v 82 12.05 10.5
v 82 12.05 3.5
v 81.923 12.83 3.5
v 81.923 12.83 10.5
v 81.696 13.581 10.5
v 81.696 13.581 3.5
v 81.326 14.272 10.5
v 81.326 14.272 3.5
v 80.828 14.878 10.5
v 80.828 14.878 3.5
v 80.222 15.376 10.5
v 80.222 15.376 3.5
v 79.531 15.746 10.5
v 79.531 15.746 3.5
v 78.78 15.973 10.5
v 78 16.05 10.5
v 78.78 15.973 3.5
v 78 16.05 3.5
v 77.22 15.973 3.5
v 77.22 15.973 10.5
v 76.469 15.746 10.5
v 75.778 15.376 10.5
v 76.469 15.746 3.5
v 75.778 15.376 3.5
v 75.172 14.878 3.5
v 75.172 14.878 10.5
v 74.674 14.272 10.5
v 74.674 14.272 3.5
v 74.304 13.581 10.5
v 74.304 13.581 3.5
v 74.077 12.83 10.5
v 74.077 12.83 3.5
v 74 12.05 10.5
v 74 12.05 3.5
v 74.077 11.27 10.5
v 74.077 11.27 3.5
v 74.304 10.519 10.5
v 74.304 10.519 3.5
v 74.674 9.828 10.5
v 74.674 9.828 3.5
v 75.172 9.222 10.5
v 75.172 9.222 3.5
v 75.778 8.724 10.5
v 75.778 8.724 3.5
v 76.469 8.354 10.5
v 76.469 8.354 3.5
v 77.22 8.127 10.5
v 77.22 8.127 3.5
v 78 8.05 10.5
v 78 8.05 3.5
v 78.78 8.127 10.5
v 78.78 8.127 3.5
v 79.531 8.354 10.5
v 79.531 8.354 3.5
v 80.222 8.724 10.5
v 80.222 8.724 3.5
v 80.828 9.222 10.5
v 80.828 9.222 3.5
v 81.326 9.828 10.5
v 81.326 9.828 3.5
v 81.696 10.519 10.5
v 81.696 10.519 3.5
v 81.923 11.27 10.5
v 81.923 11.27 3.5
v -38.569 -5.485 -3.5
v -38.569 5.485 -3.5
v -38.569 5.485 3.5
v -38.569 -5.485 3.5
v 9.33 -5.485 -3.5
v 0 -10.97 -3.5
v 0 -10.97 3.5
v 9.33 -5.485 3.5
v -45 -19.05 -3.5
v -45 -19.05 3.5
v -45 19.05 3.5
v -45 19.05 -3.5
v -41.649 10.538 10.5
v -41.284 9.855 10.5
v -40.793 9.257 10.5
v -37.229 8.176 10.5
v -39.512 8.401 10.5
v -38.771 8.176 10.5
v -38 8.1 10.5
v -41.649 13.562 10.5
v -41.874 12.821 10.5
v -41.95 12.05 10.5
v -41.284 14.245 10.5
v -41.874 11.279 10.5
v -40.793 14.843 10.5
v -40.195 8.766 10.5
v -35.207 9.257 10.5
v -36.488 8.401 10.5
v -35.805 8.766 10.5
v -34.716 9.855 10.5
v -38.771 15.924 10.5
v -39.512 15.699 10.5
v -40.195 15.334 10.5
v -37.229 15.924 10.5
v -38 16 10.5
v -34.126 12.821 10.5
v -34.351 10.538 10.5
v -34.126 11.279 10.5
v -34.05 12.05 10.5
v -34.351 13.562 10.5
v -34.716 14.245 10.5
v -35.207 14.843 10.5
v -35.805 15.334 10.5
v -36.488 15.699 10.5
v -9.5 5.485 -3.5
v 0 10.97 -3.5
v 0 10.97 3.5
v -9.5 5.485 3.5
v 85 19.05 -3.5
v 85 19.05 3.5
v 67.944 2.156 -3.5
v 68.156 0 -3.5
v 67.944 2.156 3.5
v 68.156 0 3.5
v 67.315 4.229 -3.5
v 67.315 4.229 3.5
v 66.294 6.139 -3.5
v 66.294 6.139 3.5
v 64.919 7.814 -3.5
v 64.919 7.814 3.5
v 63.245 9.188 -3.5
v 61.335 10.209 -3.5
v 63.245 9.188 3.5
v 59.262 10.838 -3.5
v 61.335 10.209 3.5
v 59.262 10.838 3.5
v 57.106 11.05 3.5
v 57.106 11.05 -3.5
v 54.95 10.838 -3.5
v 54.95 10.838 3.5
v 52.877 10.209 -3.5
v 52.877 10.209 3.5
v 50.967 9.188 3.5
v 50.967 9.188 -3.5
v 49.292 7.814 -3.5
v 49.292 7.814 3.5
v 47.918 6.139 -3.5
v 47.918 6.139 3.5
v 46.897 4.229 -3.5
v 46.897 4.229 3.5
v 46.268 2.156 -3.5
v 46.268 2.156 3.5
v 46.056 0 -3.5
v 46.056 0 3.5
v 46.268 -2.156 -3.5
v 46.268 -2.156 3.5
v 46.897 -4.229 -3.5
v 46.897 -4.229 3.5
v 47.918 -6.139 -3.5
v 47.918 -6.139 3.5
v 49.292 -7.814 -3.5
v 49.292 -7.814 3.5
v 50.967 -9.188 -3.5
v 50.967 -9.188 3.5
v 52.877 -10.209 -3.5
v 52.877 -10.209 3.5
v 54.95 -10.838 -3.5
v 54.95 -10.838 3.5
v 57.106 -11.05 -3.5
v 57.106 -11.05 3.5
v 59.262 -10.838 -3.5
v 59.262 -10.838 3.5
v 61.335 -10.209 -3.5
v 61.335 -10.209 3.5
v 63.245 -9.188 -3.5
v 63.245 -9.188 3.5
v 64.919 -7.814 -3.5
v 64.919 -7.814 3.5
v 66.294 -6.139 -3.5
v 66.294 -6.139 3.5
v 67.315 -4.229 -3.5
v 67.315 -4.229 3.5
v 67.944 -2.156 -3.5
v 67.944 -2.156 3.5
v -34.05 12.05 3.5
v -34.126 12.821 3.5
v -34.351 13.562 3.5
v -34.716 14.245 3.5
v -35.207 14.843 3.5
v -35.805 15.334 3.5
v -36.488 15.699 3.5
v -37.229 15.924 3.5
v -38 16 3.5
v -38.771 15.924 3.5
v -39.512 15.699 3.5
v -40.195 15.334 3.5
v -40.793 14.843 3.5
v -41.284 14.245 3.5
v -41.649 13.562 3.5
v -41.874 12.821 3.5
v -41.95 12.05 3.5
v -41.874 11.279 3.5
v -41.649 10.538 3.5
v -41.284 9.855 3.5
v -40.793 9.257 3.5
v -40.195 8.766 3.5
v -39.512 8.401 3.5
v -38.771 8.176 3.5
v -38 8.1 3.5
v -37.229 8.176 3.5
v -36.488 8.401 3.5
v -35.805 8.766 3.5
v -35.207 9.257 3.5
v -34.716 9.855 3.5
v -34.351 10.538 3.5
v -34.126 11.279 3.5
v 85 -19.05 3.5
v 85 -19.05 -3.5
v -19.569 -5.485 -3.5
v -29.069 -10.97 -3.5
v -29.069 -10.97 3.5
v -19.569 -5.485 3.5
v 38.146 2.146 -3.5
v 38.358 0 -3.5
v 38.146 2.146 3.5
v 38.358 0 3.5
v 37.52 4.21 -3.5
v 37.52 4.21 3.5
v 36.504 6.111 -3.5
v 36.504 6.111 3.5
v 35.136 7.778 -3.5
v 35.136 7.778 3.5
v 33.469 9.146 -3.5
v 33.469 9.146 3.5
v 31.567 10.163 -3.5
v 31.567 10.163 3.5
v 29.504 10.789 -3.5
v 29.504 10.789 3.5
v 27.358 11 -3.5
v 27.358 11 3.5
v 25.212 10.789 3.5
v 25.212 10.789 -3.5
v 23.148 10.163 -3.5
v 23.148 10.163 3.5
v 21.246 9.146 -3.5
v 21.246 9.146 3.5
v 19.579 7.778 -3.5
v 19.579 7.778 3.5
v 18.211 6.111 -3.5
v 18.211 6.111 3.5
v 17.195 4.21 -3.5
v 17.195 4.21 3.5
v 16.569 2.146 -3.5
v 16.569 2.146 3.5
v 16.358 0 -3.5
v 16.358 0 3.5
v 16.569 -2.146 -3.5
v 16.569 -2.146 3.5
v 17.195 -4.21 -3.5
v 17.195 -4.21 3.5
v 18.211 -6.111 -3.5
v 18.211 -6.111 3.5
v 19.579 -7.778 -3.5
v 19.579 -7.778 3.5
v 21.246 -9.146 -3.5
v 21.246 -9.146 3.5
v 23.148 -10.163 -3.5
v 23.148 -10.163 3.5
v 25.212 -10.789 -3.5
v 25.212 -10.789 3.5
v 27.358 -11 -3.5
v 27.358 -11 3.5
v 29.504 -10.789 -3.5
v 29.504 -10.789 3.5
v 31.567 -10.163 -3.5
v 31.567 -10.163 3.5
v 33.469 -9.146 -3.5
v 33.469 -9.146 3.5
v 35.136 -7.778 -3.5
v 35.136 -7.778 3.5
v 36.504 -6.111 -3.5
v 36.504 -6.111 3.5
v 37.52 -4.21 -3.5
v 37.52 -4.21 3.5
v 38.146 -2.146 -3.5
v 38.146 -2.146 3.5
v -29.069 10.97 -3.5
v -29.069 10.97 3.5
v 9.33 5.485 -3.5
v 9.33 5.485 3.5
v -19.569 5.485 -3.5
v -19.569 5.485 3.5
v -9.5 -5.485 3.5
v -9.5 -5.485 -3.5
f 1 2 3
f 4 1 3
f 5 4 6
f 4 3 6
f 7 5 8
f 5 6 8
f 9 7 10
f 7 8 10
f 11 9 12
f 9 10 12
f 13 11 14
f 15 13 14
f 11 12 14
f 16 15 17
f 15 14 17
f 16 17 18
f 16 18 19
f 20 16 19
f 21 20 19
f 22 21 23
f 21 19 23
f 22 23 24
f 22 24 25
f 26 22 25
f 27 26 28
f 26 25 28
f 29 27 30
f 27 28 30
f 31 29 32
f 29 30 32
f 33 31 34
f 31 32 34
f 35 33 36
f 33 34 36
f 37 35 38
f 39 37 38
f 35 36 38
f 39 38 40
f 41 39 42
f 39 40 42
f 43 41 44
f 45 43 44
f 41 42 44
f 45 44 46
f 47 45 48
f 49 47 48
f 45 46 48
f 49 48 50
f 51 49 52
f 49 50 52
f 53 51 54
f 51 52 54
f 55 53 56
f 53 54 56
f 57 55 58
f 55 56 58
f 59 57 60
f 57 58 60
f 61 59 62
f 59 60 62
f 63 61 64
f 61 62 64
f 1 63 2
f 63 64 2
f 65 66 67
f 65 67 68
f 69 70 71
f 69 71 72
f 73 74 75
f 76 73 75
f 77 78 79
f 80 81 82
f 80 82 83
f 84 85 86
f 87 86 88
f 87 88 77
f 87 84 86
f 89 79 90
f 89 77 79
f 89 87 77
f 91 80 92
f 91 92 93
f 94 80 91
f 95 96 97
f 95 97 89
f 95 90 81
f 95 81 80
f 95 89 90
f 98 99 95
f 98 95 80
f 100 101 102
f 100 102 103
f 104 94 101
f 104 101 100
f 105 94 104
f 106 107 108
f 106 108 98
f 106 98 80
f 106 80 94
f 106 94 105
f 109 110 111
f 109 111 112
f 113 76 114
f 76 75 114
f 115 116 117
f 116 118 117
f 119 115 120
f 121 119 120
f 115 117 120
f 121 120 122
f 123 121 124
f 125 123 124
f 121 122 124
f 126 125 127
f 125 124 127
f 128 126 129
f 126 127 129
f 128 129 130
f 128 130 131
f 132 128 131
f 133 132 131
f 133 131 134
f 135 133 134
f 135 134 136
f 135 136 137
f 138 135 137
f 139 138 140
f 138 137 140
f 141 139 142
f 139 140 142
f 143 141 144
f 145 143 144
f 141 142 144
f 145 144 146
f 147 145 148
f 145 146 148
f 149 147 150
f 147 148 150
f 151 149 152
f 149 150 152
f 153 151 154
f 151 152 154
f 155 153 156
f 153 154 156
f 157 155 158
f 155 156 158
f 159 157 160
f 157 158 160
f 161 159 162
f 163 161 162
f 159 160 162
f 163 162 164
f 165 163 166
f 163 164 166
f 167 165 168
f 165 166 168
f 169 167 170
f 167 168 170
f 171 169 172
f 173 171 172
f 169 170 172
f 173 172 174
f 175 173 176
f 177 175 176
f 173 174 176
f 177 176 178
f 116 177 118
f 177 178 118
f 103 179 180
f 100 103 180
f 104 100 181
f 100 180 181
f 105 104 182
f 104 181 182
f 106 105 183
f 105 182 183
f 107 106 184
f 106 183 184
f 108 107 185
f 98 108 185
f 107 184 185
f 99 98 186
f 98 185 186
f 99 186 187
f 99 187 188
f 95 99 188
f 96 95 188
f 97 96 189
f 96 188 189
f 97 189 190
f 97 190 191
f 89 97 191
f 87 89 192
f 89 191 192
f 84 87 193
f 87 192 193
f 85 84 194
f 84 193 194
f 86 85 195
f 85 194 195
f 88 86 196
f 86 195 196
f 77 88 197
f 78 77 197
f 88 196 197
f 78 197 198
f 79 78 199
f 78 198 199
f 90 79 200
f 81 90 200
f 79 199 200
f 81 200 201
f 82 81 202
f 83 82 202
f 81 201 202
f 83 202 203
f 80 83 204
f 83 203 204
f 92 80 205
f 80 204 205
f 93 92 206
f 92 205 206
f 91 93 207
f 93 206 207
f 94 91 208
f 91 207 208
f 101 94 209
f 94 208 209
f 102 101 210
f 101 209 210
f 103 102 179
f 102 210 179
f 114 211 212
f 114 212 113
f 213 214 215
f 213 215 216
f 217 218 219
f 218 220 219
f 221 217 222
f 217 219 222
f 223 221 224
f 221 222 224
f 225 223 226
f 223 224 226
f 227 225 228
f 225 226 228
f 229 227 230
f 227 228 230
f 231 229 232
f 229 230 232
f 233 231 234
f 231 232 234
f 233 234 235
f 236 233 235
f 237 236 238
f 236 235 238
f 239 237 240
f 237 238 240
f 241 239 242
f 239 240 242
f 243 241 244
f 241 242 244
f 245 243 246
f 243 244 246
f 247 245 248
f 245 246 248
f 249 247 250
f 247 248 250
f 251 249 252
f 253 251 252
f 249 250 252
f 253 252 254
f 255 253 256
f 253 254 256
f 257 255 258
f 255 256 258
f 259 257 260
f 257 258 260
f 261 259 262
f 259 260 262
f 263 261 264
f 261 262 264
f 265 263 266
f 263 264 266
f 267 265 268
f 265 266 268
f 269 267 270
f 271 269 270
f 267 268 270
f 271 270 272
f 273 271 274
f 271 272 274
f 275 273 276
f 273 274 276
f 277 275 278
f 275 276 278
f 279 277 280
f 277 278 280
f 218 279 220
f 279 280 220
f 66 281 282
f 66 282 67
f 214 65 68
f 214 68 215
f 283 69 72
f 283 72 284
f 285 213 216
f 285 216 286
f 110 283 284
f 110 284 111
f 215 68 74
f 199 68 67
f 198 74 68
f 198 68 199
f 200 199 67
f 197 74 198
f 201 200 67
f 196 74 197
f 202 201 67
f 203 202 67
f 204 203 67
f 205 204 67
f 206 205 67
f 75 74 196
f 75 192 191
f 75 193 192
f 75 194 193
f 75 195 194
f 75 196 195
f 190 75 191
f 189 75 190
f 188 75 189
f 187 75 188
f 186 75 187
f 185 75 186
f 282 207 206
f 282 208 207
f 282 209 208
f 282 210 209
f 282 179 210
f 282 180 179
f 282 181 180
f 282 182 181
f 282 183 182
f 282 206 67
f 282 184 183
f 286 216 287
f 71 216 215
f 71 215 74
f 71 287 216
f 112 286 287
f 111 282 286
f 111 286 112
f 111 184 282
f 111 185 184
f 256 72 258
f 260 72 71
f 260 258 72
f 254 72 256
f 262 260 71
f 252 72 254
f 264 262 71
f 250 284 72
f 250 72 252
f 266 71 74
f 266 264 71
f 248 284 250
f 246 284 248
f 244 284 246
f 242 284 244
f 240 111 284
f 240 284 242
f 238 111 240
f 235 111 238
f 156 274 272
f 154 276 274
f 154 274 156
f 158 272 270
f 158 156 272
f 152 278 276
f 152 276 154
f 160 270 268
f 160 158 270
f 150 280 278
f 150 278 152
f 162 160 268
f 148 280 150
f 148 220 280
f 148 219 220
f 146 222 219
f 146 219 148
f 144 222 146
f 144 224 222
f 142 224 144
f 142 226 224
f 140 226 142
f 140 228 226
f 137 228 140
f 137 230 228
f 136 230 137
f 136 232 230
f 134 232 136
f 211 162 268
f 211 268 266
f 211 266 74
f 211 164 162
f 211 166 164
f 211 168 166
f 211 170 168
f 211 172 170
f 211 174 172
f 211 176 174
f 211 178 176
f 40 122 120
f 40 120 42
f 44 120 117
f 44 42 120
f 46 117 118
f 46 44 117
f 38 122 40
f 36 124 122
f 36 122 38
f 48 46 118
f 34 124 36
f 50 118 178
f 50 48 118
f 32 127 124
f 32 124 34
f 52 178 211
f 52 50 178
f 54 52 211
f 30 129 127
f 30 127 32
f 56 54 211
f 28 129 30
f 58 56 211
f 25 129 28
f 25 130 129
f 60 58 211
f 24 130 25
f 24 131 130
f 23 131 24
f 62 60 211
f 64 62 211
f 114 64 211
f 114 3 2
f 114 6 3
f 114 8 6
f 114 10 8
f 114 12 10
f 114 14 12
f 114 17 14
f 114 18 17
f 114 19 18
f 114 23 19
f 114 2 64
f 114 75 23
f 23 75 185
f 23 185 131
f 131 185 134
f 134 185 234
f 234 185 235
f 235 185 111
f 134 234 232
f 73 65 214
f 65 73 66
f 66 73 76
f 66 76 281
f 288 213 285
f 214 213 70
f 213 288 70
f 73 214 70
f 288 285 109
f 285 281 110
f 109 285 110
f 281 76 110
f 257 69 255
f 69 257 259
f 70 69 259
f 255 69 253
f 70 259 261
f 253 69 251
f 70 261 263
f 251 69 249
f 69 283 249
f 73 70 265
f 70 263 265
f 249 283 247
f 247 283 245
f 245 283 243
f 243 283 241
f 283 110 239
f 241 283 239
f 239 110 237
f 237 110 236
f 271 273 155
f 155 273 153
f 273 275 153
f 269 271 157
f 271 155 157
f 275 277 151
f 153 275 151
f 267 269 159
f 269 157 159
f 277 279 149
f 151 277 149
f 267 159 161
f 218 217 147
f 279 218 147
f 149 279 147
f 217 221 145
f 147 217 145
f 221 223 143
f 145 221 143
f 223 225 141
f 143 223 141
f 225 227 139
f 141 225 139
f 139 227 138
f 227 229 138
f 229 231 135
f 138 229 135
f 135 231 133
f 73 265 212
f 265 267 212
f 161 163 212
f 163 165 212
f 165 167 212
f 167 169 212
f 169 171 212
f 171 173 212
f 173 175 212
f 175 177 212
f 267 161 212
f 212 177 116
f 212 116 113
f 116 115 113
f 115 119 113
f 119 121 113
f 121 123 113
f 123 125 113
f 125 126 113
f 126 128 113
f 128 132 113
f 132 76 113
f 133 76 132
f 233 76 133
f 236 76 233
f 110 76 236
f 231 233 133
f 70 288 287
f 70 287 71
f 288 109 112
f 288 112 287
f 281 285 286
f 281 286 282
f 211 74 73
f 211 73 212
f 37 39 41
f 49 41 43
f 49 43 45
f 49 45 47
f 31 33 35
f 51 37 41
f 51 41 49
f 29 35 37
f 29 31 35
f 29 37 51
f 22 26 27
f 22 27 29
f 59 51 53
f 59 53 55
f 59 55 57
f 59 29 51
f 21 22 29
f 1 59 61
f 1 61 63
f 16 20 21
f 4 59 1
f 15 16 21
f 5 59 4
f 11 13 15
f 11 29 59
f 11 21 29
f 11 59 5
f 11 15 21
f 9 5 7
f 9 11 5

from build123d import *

# Parameters (mm, degrees)
F0_W     = 130
F0_H     = 38.1
F2_DEPTH = 3.5
F1_R     = 11
F1_R_2   = 11.05
F3_DEPTH = 12.5
F4_R     = 4
F4_R_2   = 3.95
F5_DEPTH = 7


with BuildPart() as f2:
    # F0 (on Top) → F2 (new body, symmetric)
    with BuildSketch(Plane.XY):
        with Locations((20, 0)):
            Rectangle(F0_W, F0_H)
    extrude(amount=F2_DEPTH, both=True)

    # F1 (on face) → F3 (cut, symmetric)
    with BuildSketch(Plane.XY):
        Polygon((9.33, -5.4848275573), (9.33, 5.4848275573), (0, 10.9696551146), (-9.5, 5.4848275573), (-9.5, -5.4848275573), (0, -10.9696551146), align=None)
        with Locations((27.3575689644, 0)):
            Circle(F1_R)
        Polygon((-19.5691703558, -5.4848275573), (-19.5691703558, 5.4848275573), (-29.0691703558, 10.9696551146), (-38.5691703558, 5.4848275573), (-38.5691703558, -5.4848275573), (-29.0691703558, -10.9696551146), align=None)
        with Locations((57.105883956, 0)):
            Circle(F1_R_2)
    extrude(amount=F3_DEPTH, both=True, mode=Mode.SUBTRACT)

    # F4 (on face) → F5 (join)
    with BuildSketch(Plane.XY.offset(3.5)):
        with Locations((78, 12.05)):
            Circle(F4_R)
        with Locations((-38, 12.05)):
            Circle(F4_R_2)
    extrude(amount=F5_DEPTH)


solid = f2.part
